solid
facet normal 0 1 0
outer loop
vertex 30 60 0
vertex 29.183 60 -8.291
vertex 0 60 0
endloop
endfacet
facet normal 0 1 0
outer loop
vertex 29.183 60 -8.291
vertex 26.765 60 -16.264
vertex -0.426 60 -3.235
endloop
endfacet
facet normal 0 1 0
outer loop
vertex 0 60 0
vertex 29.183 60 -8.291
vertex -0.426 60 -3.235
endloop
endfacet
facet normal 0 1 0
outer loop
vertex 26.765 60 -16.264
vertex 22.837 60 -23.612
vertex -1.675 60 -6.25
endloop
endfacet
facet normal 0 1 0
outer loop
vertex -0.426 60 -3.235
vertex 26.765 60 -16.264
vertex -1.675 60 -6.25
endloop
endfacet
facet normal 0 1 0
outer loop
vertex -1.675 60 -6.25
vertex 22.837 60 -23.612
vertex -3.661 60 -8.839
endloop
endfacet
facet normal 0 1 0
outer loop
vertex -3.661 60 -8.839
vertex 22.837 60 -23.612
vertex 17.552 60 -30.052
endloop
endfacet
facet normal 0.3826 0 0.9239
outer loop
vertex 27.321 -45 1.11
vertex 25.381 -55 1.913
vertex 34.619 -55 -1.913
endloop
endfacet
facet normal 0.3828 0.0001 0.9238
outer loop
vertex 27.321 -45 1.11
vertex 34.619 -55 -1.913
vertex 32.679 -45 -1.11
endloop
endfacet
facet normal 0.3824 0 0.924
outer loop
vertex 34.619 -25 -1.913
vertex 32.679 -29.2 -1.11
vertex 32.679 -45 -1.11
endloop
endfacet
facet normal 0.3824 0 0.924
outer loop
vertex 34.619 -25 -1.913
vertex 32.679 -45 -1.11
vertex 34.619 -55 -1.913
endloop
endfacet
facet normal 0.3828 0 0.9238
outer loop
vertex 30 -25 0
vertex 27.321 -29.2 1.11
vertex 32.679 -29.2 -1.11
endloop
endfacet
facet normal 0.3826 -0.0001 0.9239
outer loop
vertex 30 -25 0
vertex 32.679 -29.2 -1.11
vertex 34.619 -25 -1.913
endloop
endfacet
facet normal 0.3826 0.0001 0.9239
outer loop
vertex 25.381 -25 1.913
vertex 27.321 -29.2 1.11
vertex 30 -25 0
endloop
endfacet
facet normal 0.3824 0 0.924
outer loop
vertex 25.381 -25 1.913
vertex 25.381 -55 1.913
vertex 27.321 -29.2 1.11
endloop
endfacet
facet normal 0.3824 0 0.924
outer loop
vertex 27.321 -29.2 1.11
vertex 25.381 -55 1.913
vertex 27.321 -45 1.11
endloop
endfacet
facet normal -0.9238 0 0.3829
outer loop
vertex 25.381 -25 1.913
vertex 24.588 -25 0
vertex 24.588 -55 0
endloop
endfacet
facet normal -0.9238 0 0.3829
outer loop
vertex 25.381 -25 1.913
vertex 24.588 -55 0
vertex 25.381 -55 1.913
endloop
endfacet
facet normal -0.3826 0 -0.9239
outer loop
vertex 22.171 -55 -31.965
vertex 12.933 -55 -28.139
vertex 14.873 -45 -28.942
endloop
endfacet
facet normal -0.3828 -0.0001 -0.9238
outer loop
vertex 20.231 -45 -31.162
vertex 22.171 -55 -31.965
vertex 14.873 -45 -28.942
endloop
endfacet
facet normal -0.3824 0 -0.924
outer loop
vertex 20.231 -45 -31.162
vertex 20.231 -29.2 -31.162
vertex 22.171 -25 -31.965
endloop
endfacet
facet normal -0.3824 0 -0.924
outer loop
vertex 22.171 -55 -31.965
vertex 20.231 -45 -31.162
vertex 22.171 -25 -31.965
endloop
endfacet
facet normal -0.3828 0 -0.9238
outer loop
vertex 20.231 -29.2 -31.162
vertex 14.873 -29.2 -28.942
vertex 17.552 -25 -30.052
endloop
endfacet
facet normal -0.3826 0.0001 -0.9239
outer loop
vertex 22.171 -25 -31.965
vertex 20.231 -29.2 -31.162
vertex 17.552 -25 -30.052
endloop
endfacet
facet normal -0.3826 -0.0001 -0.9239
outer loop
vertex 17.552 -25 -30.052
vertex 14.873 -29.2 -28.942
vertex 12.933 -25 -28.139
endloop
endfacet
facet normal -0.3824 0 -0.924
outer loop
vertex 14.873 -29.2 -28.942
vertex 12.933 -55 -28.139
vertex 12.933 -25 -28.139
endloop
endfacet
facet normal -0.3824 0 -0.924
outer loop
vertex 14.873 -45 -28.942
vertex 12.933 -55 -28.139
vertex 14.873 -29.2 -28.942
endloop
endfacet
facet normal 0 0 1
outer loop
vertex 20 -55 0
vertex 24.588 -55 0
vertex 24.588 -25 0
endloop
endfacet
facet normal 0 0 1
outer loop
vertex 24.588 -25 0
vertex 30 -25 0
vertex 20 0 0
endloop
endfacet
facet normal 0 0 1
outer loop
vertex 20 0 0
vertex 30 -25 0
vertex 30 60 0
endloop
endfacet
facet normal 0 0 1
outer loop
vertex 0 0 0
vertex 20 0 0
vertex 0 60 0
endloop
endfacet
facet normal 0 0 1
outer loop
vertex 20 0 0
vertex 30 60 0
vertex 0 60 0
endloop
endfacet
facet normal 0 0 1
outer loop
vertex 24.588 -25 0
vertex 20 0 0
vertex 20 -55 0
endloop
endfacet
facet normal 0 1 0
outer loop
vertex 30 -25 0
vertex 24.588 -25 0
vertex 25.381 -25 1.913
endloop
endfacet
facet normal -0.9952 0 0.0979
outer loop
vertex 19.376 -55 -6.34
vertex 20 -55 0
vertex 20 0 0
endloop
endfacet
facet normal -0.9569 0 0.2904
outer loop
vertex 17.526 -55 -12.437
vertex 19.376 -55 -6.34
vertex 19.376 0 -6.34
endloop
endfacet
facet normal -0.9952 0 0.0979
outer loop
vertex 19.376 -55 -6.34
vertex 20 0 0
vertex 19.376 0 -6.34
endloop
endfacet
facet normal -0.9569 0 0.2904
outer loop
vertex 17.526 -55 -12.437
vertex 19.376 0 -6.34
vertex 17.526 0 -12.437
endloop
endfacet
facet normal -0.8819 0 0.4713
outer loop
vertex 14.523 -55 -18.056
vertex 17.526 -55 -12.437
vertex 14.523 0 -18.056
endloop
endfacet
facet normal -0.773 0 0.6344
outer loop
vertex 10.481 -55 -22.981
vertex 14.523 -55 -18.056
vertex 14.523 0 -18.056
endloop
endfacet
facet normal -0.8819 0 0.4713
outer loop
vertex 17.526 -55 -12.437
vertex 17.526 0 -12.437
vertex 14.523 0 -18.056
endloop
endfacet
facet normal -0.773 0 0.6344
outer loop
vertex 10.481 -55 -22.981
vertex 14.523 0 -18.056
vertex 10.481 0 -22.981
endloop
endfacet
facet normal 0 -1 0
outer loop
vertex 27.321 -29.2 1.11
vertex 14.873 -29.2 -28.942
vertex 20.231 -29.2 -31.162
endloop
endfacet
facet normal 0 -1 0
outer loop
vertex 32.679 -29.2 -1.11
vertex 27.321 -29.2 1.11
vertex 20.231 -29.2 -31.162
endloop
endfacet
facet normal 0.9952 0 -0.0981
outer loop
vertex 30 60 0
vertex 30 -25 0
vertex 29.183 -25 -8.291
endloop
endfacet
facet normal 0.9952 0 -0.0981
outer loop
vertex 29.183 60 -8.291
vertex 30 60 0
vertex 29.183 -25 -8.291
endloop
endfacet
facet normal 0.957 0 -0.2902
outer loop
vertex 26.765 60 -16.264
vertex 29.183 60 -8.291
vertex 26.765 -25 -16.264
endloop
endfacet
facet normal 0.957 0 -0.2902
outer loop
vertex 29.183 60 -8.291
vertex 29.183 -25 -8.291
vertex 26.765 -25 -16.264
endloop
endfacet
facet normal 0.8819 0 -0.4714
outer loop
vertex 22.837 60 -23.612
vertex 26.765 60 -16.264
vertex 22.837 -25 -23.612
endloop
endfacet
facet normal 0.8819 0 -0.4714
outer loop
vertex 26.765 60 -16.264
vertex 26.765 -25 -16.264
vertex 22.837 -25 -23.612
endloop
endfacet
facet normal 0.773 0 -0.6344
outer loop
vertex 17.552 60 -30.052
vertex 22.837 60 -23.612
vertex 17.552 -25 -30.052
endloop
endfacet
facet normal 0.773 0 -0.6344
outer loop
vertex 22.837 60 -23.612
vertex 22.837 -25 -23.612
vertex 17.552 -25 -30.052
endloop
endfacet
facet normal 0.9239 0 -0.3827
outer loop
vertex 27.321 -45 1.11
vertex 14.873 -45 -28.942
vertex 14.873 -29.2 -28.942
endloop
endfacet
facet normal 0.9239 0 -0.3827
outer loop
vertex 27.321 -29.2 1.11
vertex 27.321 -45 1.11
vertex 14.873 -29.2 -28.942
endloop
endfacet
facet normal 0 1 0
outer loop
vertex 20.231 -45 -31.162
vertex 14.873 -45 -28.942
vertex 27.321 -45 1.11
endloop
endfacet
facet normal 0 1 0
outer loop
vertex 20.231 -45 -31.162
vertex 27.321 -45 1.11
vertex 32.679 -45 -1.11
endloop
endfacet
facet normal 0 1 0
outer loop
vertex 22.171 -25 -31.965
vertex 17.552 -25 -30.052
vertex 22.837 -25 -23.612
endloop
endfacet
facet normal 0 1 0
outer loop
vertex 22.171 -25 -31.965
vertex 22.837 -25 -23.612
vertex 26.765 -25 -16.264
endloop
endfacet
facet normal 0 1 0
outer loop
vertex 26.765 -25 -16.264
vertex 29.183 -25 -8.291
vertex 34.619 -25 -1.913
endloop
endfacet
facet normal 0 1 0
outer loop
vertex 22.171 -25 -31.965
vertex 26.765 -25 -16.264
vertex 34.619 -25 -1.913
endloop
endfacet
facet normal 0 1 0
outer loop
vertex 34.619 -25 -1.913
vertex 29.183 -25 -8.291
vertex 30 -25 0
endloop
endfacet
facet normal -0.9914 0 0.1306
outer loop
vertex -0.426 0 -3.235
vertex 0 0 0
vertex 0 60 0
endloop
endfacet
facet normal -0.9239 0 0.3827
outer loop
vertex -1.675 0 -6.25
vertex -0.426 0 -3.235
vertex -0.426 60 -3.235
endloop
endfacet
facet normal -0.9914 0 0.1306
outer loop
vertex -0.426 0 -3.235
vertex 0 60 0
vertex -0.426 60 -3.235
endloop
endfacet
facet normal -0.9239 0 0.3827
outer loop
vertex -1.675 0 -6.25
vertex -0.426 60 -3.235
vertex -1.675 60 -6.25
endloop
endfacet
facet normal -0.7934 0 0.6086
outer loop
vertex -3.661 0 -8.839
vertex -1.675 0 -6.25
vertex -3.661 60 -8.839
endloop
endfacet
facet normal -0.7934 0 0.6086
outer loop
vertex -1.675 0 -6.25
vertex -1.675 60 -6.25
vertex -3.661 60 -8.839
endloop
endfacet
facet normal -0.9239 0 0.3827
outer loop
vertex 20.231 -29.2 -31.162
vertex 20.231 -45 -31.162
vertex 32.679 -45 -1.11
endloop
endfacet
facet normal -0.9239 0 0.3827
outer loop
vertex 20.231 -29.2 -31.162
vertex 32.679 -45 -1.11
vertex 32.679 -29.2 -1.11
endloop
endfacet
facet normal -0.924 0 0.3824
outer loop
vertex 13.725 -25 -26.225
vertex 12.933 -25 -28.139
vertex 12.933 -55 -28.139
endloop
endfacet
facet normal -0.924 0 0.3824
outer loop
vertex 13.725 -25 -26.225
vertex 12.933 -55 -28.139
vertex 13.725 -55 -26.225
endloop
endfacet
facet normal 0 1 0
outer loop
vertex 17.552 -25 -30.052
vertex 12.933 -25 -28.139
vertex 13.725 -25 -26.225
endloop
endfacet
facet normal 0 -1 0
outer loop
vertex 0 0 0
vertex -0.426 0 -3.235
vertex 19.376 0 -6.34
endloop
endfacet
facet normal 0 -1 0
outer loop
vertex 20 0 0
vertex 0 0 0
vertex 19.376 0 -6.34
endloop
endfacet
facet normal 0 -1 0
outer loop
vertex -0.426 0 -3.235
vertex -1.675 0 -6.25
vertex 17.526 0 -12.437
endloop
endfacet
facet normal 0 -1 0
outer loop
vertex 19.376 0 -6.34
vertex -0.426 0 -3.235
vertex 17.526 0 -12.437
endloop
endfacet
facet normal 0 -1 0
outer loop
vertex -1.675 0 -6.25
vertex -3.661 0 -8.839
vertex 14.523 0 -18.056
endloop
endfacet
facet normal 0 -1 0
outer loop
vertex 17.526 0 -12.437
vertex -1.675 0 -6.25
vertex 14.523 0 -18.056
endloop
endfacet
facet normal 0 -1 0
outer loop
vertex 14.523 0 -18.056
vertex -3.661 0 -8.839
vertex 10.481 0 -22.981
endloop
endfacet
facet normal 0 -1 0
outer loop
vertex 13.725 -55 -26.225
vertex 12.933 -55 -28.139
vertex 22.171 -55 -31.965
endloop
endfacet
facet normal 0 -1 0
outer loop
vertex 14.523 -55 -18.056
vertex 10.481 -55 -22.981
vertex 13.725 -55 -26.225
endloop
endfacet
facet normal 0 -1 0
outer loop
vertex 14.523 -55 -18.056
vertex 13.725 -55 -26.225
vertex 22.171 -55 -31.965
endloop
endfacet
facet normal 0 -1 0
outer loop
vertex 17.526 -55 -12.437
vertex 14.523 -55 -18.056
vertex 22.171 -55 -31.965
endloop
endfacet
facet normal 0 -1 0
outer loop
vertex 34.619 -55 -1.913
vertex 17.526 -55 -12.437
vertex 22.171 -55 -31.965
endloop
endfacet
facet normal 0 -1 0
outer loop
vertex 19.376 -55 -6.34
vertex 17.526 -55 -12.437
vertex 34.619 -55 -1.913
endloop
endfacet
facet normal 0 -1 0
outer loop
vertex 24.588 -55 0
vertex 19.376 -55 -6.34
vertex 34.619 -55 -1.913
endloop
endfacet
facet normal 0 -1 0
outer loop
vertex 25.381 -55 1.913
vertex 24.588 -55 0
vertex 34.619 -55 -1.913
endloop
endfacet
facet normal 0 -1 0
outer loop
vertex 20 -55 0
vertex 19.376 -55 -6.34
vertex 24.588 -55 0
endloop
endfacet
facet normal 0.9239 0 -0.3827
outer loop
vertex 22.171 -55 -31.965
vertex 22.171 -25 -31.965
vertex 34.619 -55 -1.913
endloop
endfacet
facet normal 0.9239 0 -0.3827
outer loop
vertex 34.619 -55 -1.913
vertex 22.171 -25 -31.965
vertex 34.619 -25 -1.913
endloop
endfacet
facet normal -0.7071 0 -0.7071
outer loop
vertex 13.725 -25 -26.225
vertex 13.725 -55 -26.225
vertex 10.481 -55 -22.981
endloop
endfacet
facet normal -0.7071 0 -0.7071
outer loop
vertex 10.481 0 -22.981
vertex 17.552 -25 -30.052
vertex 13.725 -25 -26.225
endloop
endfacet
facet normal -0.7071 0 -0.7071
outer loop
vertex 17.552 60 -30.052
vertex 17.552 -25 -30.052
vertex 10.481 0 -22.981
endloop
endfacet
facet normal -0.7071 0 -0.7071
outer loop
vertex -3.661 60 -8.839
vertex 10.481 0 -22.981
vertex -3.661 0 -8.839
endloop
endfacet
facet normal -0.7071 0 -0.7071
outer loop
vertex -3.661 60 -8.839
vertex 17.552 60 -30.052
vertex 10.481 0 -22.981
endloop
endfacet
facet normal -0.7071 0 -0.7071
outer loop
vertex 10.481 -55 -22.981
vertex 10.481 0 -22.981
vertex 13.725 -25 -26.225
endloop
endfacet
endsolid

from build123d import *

# Parameters (mm, degrees)
REVOLVE1_ANGLE      = 45
SKETCH2_W           = 32.528091751
SKETCH2_H           = 30
BOSS_EXTRUDE1_DEPTH = 5
SKETCH3_W           = 5.8
SKETCH3_H           = 15.8
CUT_EXTRUDE1_DEPTH  = 43.413800206


with BuildPart() as part:
    # Sketch1 → Revolve1 (revolve)
    with BuildSketch(Plane.XY):
        Polygon((0, 0), (0, 60), (30, 60), (30, -55), (20, -55), (20, 0), align=None)
    revolve(axis=Axis((-12.5, 0, 0), (0, 1, 0)), revolution_arc=REVOLVE1_ANGLE)

    # Sketch2 → Boss-Extrude1 (add, symmetric)
    with BuildSketch(Plane(origin=(25.606601718, 0, -10.606601718), x_dir=(0.382683432, 0, 0.923879533), z_dir=(-0.923879533, 0, 0.382683432))):
        with Locations((-4.783542905, -40)):
            Rectangle(SKETCH2_W, SKETCH2_H)
    extrude(amount=BOSS_EXTRUDE1_DEPTH, both=True)

    # Sketch3 → Cut-Extrude1 (cut, through all)
    with BuildSketch(Plane(origin=(4.393398282, 0, 10.606601718), x_dir=(0.923879533, 0, -0.382683432), z_dir=(0.382683432, 0, 0.923879533))):
        with Locations((27.716385975, -37.1)):
            Rectangle(SKETCH3_W, SKETCH3_H)
    extrude(amount=-CUT_EXTRUDE1_DEPTH, mode=Mode.SUBTRACT)


solid = part.part
